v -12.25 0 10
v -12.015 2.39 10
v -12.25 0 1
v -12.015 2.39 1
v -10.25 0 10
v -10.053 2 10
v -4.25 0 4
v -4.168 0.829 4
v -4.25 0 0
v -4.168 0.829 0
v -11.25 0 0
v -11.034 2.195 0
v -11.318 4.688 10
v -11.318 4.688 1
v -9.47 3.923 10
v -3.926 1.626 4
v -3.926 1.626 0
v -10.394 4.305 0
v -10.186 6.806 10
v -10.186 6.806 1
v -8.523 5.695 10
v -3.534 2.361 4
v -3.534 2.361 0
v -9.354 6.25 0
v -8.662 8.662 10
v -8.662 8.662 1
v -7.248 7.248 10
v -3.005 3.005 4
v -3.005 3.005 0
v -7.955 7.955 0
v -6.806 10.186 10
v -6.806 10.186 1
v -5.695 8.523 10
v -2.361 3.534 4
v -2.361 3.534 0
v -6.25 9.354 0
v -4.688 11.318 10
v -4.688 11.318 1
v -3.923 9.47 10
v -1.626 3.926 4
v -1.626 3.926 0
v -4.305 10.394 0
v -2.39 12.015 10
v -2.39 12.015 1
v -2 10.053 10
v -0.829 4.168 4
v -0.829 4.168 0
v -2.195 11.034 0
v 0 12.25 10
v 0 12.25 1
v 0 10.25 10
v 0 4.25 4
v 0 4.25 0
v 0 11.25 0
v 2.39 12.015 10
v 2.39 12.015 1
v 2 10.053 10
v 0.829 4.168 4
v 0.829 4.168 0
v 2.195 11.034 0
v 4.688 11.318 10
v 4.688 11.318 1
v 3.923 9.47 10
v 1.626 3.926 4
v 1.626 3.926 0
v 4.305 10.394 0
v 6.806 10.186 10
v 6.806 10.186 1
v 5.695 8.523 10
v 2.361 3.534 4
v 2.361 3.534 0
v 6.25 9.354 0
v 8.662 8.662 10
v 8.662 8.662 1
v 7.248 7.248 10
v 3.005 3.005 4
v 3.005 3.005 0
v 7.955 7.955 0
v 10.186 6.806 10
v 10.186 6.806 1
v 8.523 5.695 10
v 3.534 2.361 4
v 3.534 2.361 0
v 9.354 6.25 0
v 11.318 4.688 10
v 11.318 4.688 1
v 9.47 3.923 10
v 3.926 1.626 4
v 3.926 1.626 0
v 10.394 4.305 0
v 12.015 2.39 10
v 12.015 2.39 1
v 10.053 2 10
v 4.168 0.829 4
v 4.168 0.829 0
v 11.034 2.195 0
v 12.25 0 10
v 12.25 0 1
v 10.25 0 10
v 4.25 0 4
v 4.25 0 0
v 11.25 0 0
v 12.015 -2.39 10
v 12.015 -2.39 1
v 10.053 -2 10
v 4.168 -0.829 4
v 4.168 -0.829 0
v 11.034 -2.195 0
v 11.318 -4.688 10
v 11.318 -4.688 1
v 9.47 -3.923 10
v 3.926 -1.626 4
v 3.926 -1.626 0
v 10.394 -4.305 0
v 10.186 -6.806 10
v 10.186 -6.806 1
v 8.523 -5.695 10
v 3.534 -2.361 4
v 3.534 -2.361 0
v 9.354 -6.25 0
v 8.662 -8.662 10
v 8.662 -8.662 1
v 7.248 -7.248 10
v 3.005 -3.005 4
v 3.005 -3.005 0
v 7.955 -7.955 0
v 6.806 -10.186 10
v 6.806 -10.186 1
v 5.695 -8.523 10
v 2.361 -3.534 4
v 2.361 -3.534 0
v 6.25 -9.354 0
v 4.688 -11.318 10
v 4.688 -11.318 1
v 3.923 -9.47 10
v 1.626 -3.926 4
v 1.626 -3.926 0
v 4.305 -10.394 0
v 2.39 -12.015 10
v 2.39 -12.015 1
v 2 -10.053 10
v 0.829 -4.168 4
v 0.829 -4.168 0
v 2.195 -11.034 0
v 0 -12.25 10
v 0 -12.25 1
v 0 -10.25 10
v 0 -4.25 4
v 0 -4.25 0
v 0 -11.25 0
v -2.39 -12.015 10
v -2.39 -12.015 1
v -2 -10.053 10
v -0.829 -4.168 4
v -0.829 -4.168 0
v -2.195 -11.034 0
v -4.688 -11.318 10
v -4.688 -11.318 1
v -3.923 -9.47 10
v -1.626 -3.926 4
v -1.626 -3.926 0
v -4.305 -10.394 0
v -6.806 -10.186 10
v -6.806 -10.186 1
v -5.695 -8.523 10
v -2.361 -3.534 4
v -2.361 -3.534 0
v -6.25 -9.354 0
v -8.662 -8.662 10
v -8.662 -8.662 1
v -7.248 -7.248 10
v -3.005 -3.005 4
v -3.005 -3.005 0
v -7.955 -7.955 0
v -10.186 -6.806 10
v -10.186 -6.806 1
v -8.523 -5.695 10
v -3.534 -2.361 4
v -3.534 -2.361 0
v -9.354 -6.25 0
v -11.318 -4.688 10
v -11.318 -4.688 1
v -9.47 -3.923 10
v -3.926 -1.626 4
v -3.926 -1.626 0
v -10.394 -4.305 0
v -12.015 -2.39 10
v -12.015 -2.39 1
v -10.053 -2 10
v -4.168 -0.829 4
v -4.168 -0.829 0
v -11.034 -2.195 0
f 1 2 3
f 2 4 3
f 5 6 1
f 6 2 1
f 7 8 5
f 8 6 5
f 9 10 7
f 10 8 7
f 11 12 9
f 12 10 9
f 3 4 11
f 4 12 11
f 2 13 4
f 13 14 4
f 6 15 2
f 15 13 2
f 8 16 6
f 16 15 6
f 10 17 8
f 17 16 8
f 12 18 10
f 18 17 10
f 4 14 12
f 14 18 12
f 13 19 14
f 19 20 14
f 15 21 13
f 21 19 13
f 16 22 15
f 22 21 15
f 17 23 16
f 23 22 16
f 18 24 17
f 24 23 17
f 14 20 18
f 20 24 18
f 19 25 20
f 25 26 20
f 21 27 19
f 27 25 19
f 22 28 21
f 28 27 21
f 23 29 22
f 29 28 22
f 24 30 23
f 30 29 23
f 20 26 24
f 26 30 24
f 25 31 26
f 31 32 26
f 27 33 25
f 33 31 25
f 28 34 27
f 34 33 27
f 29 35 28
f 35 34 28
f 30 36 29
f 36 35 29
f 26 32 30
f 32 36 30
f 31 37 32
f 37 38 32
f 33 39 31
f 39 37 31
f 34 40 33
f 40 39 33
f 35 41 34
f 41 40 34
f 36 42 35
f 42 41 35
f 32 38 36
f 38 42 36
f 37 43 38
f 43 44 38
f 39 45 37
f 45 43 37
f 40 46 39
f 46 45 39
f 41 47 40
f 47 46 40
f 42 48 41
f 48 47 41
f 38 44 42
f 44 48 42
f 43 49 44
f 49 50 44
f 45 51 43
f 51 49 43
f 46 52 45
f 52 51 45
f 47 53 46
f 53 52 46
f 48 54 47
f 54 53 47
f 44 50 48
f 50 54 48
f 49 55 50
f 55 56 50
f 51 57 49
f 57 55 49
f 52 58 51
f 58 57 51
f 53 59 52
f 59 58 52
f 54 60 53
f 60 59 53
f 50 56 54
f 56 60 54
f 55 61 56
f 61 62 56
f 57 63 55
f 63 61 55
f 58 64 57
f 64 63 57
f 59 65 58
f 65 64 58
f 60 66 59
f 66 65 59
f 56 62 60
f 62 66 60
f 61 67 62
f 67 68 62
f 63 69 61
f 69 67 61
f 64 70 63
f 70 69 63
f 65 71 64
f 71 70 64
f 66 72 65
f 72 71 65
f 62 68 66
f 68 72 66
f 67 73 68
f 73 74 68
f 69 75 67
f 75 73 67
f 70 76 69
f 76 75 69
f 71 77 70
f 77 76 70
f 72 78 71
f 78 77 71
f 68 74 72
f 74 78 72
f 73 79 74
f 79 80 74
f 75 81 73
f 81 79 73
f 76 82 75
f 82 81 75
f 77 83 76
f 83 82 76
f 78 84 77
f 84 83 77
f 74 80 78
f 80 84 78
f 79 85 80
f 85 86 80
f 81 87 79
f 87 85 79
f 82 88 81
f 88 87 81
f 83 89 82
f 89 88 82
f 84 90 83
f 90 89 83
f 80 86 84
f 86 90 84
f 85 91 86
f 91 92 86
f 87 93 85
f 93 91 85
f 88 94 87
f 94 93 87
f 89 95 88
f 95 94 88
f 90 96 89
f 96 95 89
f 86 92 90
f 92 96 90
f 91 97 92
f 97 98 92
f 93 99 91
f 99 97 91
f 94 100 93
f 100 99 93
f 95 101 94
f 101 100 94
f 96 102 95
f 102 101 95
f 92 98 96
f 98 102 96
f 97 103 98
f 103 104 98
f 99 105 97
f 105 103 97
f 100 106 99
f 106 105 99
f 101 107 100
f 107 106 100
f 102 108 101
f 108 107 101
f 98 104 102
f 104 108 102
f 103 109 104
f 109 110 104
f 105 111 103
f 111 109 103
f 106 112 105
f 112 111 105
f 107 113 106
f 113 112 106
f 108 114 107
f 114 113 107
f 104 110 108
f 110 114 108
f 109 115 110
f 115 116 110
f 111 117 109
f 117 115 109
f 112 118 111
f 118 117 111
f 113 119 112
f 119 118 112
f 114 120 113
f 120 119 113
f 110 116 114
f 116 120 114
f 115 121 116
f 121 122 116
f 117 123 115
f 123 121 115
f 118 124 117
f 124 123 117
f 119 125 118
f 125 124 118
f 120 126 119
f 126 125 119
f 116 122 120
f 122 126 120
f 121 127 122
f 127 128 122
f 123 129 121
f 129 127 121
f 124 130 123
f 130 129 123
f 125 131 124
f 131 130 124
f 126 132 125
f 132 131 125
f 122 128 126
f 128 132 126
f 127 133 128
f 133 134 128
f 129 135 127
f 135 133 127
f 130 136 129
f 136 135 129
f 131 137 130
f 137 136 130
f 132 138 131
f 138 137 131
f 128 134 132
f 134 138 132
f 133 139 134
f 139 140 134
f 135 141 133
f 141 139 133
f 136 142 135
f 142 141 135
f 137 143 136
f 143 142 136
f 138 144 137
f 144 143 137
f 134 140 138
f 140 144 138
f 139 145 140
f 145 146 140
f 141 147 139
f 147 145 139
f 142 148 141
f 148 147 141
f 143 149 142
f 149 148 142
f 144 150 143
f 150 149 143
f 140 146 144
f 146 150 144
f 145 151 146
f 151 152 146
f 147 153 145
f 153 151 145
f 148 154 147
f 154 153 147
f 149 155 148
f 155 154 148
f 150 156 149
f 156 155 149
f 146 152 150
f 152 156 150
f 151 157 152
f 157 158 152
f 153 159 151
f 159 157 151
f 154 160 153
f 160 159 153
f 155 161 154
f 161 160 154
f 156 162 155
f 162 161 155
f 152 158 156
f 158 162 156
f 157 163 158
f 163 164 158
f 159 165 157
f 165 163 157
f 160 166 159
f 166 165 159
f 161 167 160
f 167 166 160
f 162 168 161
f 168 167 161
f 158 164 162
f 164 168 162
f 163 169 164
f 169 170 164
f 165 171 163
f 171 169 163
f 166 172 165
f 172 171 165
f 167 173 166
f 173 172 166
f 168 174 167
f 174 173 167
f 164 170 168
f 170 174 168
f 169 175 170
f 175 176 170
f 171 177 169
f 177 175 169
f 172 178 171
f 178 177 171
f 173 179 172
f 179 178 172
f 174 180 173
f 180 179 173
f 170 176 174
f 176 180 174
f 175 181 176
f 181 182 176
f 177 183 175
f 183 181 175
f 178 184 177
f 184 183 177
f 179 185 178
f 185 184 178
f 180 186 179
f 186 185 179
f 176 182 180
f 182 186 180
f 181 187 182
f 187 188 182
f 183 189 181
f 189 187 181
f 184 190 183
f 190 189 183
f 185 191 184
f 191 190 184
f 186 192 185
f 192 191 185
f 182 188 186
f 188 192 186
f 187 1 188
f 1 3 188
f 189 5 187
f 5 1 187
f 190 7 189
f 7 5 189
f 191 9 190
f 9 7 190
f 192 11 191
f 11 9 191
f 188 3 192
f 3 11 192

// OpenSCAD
$fn = 32;

// ----------------------------------------------------------------------
// Form washer: countersunk washer, 24.5 mm outside, 8.5 mm bore
// ----------------------------------------------------------------------

// --- parameters (mm) ---
revolve_angle = 360;      // full turn around the Z axis
profile_points = 6;       // points of the closed outline

profile = [[4.25, 0], [11.25, 0], [12.25, 1], [12.25, 10], [10.25, 10], [4.25, 4]];  // single closed polygon, 6 points, counter clockwise

// --- the one profile operation ---
rotate_extrude(angle = revolve_angle) polygon(points = profile);
